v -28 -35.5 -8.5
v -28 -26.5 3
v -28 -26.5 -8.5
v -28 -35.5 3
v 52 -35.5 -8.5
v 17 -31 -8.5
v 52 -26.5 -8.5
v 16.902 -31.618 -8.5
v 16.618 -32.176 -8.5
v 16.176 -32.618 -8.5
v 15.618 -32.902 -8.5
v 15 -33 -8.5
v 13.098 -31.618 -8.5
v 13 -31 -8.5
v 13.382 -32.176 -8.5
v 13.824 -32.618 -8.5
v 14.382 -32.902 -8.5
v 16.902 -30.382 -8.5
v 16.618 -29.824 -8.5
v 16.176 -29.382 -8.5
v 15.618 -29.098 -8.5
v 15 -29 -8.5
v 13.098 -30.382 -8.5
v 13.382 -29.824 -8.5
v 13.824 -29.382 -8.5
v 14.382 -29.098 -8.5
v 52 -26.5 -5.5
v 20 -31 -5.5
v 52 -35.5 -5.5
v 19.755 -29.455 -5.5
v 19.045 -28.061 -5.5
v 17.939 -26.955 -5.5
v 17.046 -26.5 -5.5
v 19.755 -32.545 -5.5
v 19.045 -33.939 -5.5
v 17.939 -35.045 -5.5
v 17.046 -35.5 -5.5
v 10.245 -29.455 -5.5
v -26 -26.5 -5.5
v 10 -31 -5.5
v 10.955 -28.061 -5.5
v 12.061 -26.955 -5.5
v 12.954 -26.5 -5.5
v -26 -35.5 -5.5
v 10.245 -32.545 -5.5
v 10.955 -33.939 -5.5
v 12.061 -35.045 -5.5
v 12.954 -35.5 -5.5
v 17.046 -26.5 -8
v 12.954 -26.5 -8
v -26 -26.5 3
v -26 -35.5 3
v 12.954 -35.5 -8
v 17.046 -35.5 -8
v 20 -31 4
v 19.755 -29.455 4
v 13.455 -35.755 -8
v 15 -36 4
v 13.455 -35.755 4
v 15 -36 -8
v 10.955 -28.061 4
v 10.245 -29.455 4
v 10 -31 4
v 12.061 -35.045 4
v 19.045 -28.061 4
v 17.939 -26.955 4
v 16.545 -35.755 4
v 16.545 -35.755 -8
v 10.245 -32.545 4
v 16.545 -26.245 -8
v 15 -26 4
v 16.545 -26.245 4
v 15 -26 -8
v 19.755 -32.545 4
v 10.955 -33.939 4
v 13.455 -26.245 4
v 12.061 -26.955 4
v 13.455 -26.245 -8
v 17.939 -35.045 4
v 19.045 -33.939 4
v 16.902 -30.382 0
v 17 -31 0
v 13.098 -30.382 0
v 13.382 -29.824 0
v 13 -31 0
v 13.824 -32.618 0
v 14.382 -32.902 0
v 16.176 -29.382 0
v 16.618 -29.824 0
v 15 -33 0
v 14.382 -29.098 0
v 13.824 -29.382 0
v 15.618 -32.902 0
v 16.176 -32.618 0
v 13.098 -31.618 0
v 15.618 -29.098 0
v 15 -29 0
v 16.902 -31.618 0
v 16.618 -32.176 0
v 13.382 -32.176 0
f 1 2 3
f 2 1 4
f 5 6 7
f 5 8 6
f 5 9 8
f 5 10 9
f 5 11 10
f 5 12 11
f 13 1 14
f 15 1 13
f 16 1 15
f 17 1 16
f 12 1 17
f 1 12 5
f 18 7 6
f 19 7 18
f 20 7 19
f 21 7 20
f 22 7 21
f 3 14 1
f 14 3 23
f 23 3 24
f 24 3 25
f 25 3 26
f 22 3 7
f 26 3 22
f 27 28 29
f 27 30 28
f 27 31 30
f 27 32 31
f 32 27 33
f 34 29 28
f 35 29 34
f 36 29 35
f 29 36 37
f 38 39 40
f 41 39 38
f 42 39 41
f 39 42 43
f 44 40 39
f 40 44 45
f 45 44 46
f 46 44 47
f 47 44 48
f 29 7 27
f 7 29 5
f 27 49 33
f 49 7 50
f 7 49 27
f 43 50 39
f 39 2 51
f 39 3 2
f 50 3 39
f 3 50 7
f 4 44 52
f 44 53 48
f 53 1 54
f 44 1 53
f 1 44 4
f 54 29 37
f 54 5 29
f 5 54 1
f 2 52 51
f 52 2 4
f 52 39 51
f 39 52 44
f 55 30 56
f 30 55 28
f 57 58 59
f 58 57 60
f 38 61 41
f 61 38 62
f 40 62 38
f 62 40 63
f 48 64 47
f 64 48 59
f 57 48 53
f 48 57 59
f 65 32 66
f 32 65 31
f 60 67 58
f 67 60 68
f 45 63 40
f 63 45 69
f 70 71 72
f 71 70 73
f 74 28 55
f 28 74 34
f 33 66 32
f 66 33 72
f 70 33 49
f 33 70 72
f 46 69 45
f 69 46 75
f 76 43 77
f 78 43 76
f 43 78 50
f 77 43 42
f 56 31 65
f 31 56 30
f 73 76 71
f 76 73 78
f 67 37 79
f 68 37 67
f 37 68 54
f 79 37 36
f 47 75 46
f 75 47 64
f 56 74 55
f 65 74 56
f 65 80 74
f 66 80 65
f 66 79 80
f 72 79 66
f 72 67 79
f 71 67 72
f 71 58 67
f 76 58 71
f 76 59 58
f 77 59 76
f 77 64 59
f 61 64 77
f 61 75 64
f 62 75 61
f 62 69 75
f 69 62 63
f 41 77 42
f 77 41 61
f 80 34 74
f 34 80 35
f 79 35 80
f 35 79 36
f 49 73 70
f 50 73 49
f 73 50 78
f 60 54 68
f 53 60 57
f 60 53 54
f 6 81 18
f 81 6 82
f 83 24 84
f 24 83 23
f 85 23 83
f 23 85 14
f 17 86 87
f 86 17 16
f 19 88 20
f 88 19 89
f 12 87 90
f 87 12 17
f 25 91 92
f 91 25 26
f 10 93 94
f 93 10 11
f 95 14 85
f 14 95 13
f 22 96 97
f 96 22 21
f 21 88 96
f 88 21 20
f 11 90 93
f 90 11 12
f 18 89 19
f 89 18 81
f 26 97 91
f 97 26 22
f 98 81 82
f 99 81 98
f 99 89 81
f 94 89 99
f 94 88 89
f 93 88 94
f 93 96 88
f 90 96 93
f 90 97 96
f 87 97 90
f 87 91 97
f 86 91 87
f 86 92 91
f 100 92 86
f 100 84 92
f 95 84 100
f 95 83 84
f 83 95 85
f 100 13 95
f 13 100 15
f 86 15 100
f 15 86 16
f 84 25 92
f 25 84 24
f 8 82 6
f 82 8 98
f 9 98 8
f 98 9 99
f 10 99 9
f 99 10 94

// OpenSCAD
$fn=20;
//iphone4 case
icase();

// can't be larger than 152.4mm
icaseX = 133;
icaseY = 90;
icaseZ = 20;
icaseShiftX = 0;
icaseShiftY = 6;
icaseShiftZ = 0;

// the Z is heighter on purpose.
// Play with ShiftZ, not Z.
iphoneX = 120;
iphoneY = 64;
iphoneZ = 50;
iphoneShiftX = 0;
iphoneShiftY = 14;
iphoneShiftZ = 17;

// the plate track cut.
plateX = 125;
plateY = 200;
plateZ = 2;
plateShiftX = 0;
plateShiftY = -50;
plateShiftZ = 7;
platetopShiftX = 0;
platetopShiftY = -50;
platetopShiftZ = 33;

// the Screen Hole.
// The X and Y are actually backwards.
screenX = 80;
screenY = 55;
screenZ = 152;
screenShiftX = 0;
screenShiftY = 14;
screenShiftZ = -5;

// the front camera Hole.
// The X and Y are actually backwards.
fcX = 20;
fcY = 25;
fcZ = 152;
fcShiftX = -45;
fcShiftY = 14;
fcShiftZ = -5;

// the front button Hole.
// The X and Y are actually backwards.
fbX = 20;
fbY = 25;
fbZ = 152;
fbShiftX = 45;
fbShiftY = 14;
fbShiftZ = -5;

// Power button
// The X and Y are actually backwards.
pbX = 30;
pbY = 15;
pbZ = 6;
pbShiftX = -65;
pbShiftY = -4;
pbShiftZ = 0;

// Headphone Jack
// The X and Y are actually backwards.
hjX = 30;
hjY = 15;
hjZ = 6;
hjShiftX = -65;
hjShiftY = 34;
hjShiftZ = 0;

// Speaker Hole with usb Iphone cable
// The X and Y are actually backwards.
sX = 30;
sY = 48;
sZ = 6;
sShiftX = 65;
sShiftY = 14;
sShiftZ = 0;

// Volume Controls
// The X and Y are actually backwards.
vX = 35;
vY = 30;
vZ = 6;
vShiftX = -35;
vShiftY = 50;
vShiftZ = 0;

//////////////////////////////////////////////////
//// Rail System Variables Passed this Point. ////
//////////////////////////////////////////////////

gRailx = 0;
gRaily = 13;
gRailz = 0;

// This is a spring hole for the rail button.
bspringX = 35;
bspringY = 10;
bspringZ = 15;
bspringXShift = 40;
bspringYShift = -44;
bspringZShift = 2;

// Rail first pass.
railx = 17;
raily = 10;
railz = 60;
railxShift = -41;
railyShift = -49;
railzShift = 0;

// Rail second pass, one triangle.
ltp = 5;
lth = 40;
ltxShift = -29;
ltyShift = -48;
ltzShift = 0;

// Rail third pass, second triangle.
rtp = 5;
rth = 40;
rtxShift = -53;
rtyShift = -48;
rtzShift = 0;

// path for rail button
prbx = 100;
prby = 10;
prbz = 15;
prbxShift = -5;
prbyShift = -44;
prbzShift = 10;

// Negative space for your finger to push the button.
nbsx = 40;
nbsy = 20;
nbsz = 60;
nbsxShift = -3;
nbsyShift = -50;
nbszShift = 0;

module icase()
{
// This is where you Copy and Paste if you need to see invisible space.




	rotate([0,180,0])
	difference()
	{
		union()
		{
			// path for rail button.
			translate([-12, -31, 7])
	    cube([80,9,3], center = true);


			// This is the leg in the spring box.
			translate([27, -31, 2])
  			cube([2,9,10], center=true);

			// hole for the handle.
			translate([-15, -31, -4])
    		cylinder(r=5,h=12);

		}

		// hole for the handle.
		translate([-15, -31, 0])
    cylinder(r=2,h=100);
	}
}
